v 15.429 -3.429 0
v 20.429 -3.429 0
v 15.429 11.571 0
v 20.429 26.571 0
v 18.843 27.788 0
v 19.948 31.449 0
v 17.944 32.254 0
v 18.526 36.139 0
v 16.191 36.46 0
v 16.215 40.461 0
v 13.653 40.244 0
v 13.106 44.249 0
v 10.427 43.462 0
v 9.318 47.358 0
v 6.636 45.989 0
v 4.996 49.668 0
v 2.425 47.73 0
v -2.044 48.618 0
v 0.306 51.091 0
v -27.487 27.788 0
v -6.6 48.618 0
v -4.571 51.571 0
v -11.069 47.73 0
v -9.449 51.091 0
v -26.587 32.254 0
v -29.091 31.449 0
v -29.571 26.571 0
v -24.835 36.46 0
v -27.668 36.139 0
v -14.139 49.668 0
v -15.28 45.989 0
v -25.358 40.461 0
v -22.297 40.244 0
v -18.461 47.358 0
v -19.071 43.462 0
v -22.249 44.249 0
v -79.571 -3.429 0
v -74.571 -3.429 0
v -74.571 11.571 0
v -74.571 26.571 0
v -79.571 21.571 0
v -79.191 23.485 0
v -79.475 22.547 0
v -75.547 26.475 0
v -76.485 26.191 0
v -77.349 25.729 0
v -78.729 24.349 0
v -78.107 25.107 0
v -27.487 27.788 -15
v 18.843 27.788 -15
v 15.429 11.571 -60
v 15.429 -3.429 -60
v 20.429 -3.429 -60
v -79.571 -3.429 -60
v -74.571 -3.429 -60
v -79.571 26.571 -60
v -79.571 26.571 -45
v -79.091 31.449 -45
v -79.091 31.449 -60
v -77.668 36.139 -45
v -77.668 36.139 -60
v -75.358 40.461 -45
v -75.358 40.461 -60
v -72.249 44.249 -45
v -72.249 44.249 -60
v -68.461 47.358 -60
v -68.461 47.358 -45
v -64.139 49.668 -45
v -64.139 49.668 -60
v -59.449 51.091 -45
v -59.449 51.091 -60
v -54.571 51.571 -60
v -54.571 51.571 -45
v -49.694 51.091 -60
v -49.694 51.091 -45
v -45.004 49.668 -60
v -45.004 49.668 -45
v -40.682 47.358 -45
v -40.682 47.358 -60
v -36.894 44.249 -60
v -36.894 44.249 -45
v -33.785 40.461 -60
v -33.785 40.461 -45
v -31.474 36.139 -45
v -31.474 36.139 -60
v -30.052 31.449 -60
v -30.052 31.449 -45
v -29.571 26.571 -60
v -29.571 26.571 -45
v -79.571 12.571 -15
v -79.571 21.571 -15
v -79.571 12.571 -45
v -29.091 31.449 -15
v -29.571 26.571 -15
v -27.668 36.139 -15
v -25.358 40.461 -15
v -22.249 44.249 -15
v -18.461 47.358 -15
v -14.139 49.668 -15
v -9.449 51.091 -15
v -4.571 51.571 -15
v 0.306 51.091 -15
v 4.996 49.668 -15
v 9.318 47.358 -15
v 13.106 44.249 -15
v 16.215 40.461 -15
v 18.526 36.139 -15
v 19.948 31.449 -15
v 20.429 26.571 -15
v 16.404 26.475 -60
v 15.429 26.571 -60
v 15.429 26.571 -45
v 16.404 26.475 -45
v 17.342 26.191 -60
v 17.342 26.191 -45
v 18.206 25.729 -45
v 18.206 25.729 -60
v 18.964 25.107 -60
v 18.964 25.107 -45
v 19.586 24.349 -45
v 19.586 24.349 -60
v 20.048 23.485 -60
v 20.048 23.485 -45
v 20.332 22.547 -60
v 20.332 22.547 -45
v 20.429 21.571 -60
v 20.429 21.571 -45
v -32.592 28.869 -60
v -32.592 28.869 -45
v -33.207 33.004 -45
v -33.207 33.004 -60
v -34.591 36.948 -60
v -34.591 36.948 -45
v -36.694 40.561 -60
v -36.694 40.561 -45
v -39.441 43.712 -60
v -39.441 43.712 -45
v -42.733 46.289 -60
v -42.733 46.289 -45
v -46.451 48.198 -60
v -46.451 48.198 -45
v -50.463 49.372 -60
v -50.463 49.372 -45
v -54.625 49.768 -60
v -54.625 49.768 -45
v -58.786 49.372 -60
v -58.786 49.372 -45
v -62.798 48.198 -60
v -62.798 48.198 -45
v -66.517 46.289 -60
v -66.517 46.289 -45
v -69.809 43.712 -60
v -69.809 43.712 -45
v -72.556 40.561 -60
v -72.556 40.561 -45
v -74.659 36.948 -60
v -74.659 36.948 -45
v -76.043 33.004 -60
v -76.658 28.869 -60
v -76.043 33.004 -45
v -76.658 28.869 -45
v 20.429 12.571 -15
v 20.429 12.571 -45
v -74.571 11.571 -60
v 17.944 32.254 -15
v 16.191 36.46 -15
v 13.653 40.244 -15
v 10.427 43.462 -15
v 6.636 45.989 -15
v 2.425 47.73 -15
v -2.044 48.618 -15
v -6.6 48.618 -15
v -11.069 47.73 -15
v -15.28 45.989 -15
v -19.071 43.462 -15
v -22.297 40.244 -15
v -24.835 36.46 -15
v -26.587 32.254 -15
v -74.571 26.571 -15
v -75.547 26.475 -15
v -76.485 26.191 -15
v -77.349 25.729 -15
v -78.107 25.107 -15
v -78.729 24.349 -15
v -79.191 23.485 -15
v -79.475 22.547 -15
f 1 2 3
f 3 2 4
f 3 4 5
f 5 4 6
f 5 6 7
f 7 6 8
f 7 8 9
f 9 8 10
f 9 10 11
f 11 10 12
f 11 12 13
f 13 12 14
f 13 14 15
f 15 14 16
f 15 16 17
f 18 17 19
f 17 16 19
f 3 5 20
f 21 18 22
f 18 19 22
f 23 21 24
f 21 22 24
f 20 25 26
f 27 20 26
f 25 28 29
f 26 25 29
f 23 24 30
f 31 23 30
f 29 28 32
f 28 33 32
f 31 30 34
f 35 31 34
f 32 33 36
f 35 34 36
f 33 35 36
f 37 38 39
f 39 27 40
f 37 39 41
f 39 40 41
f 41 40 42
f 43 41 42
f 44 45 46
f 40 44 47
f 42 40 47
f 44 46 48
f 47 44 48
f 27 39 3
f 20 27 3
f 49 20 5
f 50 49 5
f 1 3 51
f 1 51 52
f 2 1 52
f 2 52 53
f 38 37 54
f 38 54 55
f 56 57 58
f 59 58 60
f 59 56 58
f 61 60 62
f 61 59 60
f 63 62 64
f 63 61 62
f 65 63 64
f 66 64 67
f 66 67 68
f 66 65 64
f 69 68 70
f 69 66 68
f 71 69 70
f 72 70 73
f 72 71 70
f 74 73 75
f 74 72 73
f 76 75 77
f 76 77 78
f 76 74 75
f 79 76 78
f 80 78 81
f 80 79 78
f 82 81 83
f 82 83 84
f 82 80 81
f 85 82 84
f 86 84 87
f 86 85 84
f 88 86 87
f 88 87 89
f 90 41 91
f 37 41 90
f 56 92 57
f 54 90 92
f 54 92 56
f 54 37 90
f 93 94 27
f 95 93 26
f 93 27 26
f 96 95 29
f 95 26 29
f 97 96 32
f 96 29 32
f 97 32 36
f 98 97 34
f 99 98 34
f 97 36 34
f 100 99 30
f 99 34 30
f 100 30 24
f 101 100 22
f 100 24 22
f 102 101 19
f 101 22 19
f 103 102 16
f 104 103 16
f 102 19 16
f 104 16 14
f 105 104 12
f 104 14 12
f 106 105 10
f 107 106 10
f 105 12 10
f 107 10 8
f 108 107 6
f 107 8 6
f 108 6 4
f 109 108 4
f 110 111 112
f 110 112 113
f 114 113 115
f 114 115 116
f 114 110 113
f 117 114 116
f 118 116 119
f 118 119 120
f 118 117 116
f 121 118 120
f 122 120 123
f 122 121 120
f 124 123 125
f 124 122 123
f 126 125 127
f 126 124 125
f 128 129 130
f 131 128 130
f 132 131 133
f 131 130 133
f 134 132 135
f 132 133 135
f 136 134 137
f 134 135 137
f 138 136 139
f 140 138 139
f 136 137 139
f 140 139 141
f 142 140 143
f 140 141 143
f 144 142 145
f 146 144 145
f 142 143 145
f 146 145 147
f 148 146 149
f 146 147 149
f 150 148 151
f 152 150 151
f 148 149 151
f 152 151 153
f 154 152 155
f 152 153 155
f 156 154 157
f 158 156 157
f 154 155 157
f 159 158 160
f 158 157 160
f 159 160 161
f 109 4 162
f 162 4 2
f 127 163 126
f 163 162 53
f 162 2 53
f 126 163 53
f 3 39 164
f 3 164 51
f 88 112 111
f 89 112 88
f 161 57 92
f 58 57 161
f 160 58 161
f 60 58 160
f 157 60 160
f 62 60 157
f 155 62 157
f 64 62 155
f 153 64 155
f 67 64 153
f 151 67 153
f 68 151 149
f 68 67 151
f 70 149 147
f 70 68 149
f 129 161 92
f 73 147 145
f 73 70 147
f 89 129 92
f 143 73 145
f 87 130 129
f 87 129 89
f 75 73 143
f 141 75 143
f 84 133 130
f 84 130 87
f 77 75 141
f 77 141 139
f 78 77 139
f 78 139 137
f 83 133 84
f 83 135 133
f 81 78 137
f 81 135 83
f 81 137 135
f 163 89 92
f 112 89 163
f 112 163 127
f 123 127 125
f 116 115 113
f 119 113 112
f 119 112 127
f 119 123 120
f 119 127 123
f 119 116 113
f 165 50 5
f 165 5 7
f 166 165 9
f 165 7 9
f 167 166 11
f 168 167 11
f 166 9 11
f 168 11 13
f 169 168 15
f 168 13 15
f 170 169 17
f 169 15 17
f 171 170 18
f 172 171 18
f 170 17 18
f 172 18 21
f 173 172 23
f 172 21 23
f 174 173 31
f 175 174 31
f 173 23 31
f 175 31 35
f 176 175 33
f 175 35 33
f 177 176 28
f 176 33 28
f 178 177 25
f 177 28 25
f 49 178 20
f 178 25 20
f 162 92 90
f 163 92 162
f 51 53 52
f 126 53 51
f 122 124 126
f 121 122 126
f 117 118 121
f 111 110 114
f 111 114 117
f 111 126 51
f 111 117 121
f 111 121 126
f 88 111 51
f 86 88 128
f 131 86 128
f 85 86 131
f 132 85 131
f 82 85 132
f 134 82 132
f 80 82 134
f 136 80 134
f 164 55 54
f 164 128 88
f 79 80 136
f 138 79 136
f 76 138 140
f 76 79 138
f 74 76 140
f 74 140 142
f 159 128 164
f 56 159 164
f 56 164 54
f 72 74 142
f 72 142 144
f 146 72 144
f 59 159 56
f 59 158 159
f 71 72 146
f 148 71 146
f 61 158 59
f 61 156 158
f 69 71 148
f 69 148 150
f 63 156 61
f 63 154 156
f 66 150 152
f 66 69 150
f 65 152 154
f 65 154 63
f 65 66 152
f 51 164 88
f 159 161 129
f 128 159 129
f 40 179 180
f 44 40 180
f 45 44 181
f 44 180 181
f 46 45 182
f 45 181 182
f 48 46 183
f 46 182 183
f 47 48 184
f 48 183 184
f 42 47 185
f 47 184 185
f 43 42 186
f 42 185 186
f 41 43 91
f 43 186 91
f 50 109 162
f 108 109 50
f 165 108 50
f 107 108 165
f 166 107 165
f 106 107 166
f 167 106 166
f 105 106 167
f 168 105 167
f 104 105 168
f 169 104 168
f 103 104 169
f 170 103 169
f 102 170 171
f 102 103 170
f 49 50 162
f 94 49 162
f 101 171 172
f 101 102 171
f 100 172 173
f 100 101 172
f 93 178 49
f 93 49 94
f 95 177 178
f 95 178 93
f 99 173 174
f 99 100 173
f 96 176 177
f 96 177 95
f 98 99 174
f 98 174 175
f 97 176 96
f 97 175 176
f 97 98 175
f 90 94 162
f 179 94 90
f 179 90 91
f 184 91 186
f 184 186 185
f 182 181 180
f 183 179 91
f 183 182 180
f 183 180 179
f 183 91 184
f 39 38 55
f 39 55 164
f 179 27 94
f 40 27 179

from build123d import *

# Parameters (mm, degrees)
BOSS_EXTRUDE1_DEPTH  = 60
BOSS_EXTRUDE2_DEPTH  = 15
BOSS_EXTRUDE4_DEPTH  = 15
CUT_EXTRUDE3_DEPTH   = 25
CUT_EXTRUDE4_DEPTH   = 25
FILLET2_R            = 5
FILLET3_R            = 5
SKETCH10_W           = 100
SKETCH10_H           = 30
CUT_EXTRUDE8_DEPTH   = 15
SKETCH12_W           = 100
SKETCH12_H           = 30
BOSS_EXTRUDE10_DEPTH = 1


with BuildPart() as part:
    # Sketch1 → Boss-Extrude1 (new body)
    with BuildSketch(Plane.XY):
        Polygon((-74.571428571, -3.428571429), (-74.571428571, 11.571428571), (15.428571429, 11.571428571), (15.428571429, -3.428571429), (20.428571429, -3.428571429), (20.428571429, 26.571428571), (-79.571428571, 26.571428571), (-79.571428571, -3.428571429), align=None)
    extrude(amount=-BOSS_EXTRUDE1_DEPTH)

    # Sketch3 → Boss-Extrude2 (add)
    with BuildSketch(Plane(origin=(0, 0, -60), x_dir=(-1, 0, 0), z_dir=(0, 0, -1))):
        with BuildLine():
            Line((29.571428571, 26.571428571), (79.571428571, 26.571428571))
            ThreePointArc((79.571428571, 26.571428571), (54.571428571, 51.571428571), (29.571428571, 26.571428571))
        make_face()
    extrude(amount=-BOSS_EXTRUDE2_DEPTH)

    # Sketch4 → Boss-Extrude4 (add)
    with BuildSketch(Plane.XY):
        with BuildLine():
            Line((20.428571429, 26.571428571), (-29.571428571, 26.571428571))
            ThreePointArc((-29.571428571, 26.571428571), (-4.571428571, 51.571428571), (20.428571429, 26.571428571))
        make_face()
    extrude(amount=-BOSS_EXTRUDE4_DEPTH)

    # Sketch5 → Cut-Extrude3 (cut)
    with BuildSketch(Plane.XY):
        with BuildLine():
            Line((-27.48668728, 27.787723549), (18.843123445, 27.787723549))
            ThreePointArc((18.843123445, 27.787723549), (-4.321781917, 48.729240211), (-27.48668728, 27.787723549))
        make_face()
    extrude(amount=-CUT_EXTRUDE3_DEPTH, mode=Mode.SUBTRACT)

    # Sketch6 → Cut-Extrude4 (cut)
    with BuildSketch(Plane.XY.offset(-45)):
        with BuildLine():
            Line((-76.657542496, 28.868881688), (-32.592047201, 28.868881688))
            ThreePointArc((-32.592047201, 28.868881688), (-54.624794848, 49.768229308), (-76.657542496, 28.868881688))
        make_face()
    extrude(amount=-CUT_EXTRUDE4_DEPTH, mode=Mode.SUBTRACT)

    # Fillet2
    fillet2_edges = [part.edges().sort_by_distance(p)[0] for p in [
        (-79.571428571, 26.571428571, -22.5),
    ]]
    fillet(fillet2_edges, radius=FILLET2_R)

    # Fillet3
    fillet3_edges = [part.edges().sort_by_distance(p)[0] for p in [
        (20.428571429, 26.571428571, -37.5),
    ]]
    fillet(fillet3_edges, radius=FILLET3_R)

    # Sketch10 → Cut-Extrude8 (cut)
    with BuildSketch(Plane(origin=(0, 26.571428571, 0), x_dir=(1, 0, 0), z_dir=(0, 1, 0))):
        with Locations((-29.571428571, 30)):
            Rectangle(SKETCH10_W, SKETCH10_H)
    extrude(amount=-CUT_EXTRUDE8_DEPTH, mode=Mode.SUBTRACT)

    # Sketch12 → Boss-Extrude10 (add)
    with BuildSketch(Plane(origin=(0, 11.571428571, 0), x_dir=(1, 0, 0), z_dir=(0, 1, 0))):
        with Locations((-29.571428571, 30)):
            Rectangle(SKETCH12_W, SKETCH12_H)
    extrude(amount=BOSS_EXTRUDE10_DEPTH)


solid = part.part
